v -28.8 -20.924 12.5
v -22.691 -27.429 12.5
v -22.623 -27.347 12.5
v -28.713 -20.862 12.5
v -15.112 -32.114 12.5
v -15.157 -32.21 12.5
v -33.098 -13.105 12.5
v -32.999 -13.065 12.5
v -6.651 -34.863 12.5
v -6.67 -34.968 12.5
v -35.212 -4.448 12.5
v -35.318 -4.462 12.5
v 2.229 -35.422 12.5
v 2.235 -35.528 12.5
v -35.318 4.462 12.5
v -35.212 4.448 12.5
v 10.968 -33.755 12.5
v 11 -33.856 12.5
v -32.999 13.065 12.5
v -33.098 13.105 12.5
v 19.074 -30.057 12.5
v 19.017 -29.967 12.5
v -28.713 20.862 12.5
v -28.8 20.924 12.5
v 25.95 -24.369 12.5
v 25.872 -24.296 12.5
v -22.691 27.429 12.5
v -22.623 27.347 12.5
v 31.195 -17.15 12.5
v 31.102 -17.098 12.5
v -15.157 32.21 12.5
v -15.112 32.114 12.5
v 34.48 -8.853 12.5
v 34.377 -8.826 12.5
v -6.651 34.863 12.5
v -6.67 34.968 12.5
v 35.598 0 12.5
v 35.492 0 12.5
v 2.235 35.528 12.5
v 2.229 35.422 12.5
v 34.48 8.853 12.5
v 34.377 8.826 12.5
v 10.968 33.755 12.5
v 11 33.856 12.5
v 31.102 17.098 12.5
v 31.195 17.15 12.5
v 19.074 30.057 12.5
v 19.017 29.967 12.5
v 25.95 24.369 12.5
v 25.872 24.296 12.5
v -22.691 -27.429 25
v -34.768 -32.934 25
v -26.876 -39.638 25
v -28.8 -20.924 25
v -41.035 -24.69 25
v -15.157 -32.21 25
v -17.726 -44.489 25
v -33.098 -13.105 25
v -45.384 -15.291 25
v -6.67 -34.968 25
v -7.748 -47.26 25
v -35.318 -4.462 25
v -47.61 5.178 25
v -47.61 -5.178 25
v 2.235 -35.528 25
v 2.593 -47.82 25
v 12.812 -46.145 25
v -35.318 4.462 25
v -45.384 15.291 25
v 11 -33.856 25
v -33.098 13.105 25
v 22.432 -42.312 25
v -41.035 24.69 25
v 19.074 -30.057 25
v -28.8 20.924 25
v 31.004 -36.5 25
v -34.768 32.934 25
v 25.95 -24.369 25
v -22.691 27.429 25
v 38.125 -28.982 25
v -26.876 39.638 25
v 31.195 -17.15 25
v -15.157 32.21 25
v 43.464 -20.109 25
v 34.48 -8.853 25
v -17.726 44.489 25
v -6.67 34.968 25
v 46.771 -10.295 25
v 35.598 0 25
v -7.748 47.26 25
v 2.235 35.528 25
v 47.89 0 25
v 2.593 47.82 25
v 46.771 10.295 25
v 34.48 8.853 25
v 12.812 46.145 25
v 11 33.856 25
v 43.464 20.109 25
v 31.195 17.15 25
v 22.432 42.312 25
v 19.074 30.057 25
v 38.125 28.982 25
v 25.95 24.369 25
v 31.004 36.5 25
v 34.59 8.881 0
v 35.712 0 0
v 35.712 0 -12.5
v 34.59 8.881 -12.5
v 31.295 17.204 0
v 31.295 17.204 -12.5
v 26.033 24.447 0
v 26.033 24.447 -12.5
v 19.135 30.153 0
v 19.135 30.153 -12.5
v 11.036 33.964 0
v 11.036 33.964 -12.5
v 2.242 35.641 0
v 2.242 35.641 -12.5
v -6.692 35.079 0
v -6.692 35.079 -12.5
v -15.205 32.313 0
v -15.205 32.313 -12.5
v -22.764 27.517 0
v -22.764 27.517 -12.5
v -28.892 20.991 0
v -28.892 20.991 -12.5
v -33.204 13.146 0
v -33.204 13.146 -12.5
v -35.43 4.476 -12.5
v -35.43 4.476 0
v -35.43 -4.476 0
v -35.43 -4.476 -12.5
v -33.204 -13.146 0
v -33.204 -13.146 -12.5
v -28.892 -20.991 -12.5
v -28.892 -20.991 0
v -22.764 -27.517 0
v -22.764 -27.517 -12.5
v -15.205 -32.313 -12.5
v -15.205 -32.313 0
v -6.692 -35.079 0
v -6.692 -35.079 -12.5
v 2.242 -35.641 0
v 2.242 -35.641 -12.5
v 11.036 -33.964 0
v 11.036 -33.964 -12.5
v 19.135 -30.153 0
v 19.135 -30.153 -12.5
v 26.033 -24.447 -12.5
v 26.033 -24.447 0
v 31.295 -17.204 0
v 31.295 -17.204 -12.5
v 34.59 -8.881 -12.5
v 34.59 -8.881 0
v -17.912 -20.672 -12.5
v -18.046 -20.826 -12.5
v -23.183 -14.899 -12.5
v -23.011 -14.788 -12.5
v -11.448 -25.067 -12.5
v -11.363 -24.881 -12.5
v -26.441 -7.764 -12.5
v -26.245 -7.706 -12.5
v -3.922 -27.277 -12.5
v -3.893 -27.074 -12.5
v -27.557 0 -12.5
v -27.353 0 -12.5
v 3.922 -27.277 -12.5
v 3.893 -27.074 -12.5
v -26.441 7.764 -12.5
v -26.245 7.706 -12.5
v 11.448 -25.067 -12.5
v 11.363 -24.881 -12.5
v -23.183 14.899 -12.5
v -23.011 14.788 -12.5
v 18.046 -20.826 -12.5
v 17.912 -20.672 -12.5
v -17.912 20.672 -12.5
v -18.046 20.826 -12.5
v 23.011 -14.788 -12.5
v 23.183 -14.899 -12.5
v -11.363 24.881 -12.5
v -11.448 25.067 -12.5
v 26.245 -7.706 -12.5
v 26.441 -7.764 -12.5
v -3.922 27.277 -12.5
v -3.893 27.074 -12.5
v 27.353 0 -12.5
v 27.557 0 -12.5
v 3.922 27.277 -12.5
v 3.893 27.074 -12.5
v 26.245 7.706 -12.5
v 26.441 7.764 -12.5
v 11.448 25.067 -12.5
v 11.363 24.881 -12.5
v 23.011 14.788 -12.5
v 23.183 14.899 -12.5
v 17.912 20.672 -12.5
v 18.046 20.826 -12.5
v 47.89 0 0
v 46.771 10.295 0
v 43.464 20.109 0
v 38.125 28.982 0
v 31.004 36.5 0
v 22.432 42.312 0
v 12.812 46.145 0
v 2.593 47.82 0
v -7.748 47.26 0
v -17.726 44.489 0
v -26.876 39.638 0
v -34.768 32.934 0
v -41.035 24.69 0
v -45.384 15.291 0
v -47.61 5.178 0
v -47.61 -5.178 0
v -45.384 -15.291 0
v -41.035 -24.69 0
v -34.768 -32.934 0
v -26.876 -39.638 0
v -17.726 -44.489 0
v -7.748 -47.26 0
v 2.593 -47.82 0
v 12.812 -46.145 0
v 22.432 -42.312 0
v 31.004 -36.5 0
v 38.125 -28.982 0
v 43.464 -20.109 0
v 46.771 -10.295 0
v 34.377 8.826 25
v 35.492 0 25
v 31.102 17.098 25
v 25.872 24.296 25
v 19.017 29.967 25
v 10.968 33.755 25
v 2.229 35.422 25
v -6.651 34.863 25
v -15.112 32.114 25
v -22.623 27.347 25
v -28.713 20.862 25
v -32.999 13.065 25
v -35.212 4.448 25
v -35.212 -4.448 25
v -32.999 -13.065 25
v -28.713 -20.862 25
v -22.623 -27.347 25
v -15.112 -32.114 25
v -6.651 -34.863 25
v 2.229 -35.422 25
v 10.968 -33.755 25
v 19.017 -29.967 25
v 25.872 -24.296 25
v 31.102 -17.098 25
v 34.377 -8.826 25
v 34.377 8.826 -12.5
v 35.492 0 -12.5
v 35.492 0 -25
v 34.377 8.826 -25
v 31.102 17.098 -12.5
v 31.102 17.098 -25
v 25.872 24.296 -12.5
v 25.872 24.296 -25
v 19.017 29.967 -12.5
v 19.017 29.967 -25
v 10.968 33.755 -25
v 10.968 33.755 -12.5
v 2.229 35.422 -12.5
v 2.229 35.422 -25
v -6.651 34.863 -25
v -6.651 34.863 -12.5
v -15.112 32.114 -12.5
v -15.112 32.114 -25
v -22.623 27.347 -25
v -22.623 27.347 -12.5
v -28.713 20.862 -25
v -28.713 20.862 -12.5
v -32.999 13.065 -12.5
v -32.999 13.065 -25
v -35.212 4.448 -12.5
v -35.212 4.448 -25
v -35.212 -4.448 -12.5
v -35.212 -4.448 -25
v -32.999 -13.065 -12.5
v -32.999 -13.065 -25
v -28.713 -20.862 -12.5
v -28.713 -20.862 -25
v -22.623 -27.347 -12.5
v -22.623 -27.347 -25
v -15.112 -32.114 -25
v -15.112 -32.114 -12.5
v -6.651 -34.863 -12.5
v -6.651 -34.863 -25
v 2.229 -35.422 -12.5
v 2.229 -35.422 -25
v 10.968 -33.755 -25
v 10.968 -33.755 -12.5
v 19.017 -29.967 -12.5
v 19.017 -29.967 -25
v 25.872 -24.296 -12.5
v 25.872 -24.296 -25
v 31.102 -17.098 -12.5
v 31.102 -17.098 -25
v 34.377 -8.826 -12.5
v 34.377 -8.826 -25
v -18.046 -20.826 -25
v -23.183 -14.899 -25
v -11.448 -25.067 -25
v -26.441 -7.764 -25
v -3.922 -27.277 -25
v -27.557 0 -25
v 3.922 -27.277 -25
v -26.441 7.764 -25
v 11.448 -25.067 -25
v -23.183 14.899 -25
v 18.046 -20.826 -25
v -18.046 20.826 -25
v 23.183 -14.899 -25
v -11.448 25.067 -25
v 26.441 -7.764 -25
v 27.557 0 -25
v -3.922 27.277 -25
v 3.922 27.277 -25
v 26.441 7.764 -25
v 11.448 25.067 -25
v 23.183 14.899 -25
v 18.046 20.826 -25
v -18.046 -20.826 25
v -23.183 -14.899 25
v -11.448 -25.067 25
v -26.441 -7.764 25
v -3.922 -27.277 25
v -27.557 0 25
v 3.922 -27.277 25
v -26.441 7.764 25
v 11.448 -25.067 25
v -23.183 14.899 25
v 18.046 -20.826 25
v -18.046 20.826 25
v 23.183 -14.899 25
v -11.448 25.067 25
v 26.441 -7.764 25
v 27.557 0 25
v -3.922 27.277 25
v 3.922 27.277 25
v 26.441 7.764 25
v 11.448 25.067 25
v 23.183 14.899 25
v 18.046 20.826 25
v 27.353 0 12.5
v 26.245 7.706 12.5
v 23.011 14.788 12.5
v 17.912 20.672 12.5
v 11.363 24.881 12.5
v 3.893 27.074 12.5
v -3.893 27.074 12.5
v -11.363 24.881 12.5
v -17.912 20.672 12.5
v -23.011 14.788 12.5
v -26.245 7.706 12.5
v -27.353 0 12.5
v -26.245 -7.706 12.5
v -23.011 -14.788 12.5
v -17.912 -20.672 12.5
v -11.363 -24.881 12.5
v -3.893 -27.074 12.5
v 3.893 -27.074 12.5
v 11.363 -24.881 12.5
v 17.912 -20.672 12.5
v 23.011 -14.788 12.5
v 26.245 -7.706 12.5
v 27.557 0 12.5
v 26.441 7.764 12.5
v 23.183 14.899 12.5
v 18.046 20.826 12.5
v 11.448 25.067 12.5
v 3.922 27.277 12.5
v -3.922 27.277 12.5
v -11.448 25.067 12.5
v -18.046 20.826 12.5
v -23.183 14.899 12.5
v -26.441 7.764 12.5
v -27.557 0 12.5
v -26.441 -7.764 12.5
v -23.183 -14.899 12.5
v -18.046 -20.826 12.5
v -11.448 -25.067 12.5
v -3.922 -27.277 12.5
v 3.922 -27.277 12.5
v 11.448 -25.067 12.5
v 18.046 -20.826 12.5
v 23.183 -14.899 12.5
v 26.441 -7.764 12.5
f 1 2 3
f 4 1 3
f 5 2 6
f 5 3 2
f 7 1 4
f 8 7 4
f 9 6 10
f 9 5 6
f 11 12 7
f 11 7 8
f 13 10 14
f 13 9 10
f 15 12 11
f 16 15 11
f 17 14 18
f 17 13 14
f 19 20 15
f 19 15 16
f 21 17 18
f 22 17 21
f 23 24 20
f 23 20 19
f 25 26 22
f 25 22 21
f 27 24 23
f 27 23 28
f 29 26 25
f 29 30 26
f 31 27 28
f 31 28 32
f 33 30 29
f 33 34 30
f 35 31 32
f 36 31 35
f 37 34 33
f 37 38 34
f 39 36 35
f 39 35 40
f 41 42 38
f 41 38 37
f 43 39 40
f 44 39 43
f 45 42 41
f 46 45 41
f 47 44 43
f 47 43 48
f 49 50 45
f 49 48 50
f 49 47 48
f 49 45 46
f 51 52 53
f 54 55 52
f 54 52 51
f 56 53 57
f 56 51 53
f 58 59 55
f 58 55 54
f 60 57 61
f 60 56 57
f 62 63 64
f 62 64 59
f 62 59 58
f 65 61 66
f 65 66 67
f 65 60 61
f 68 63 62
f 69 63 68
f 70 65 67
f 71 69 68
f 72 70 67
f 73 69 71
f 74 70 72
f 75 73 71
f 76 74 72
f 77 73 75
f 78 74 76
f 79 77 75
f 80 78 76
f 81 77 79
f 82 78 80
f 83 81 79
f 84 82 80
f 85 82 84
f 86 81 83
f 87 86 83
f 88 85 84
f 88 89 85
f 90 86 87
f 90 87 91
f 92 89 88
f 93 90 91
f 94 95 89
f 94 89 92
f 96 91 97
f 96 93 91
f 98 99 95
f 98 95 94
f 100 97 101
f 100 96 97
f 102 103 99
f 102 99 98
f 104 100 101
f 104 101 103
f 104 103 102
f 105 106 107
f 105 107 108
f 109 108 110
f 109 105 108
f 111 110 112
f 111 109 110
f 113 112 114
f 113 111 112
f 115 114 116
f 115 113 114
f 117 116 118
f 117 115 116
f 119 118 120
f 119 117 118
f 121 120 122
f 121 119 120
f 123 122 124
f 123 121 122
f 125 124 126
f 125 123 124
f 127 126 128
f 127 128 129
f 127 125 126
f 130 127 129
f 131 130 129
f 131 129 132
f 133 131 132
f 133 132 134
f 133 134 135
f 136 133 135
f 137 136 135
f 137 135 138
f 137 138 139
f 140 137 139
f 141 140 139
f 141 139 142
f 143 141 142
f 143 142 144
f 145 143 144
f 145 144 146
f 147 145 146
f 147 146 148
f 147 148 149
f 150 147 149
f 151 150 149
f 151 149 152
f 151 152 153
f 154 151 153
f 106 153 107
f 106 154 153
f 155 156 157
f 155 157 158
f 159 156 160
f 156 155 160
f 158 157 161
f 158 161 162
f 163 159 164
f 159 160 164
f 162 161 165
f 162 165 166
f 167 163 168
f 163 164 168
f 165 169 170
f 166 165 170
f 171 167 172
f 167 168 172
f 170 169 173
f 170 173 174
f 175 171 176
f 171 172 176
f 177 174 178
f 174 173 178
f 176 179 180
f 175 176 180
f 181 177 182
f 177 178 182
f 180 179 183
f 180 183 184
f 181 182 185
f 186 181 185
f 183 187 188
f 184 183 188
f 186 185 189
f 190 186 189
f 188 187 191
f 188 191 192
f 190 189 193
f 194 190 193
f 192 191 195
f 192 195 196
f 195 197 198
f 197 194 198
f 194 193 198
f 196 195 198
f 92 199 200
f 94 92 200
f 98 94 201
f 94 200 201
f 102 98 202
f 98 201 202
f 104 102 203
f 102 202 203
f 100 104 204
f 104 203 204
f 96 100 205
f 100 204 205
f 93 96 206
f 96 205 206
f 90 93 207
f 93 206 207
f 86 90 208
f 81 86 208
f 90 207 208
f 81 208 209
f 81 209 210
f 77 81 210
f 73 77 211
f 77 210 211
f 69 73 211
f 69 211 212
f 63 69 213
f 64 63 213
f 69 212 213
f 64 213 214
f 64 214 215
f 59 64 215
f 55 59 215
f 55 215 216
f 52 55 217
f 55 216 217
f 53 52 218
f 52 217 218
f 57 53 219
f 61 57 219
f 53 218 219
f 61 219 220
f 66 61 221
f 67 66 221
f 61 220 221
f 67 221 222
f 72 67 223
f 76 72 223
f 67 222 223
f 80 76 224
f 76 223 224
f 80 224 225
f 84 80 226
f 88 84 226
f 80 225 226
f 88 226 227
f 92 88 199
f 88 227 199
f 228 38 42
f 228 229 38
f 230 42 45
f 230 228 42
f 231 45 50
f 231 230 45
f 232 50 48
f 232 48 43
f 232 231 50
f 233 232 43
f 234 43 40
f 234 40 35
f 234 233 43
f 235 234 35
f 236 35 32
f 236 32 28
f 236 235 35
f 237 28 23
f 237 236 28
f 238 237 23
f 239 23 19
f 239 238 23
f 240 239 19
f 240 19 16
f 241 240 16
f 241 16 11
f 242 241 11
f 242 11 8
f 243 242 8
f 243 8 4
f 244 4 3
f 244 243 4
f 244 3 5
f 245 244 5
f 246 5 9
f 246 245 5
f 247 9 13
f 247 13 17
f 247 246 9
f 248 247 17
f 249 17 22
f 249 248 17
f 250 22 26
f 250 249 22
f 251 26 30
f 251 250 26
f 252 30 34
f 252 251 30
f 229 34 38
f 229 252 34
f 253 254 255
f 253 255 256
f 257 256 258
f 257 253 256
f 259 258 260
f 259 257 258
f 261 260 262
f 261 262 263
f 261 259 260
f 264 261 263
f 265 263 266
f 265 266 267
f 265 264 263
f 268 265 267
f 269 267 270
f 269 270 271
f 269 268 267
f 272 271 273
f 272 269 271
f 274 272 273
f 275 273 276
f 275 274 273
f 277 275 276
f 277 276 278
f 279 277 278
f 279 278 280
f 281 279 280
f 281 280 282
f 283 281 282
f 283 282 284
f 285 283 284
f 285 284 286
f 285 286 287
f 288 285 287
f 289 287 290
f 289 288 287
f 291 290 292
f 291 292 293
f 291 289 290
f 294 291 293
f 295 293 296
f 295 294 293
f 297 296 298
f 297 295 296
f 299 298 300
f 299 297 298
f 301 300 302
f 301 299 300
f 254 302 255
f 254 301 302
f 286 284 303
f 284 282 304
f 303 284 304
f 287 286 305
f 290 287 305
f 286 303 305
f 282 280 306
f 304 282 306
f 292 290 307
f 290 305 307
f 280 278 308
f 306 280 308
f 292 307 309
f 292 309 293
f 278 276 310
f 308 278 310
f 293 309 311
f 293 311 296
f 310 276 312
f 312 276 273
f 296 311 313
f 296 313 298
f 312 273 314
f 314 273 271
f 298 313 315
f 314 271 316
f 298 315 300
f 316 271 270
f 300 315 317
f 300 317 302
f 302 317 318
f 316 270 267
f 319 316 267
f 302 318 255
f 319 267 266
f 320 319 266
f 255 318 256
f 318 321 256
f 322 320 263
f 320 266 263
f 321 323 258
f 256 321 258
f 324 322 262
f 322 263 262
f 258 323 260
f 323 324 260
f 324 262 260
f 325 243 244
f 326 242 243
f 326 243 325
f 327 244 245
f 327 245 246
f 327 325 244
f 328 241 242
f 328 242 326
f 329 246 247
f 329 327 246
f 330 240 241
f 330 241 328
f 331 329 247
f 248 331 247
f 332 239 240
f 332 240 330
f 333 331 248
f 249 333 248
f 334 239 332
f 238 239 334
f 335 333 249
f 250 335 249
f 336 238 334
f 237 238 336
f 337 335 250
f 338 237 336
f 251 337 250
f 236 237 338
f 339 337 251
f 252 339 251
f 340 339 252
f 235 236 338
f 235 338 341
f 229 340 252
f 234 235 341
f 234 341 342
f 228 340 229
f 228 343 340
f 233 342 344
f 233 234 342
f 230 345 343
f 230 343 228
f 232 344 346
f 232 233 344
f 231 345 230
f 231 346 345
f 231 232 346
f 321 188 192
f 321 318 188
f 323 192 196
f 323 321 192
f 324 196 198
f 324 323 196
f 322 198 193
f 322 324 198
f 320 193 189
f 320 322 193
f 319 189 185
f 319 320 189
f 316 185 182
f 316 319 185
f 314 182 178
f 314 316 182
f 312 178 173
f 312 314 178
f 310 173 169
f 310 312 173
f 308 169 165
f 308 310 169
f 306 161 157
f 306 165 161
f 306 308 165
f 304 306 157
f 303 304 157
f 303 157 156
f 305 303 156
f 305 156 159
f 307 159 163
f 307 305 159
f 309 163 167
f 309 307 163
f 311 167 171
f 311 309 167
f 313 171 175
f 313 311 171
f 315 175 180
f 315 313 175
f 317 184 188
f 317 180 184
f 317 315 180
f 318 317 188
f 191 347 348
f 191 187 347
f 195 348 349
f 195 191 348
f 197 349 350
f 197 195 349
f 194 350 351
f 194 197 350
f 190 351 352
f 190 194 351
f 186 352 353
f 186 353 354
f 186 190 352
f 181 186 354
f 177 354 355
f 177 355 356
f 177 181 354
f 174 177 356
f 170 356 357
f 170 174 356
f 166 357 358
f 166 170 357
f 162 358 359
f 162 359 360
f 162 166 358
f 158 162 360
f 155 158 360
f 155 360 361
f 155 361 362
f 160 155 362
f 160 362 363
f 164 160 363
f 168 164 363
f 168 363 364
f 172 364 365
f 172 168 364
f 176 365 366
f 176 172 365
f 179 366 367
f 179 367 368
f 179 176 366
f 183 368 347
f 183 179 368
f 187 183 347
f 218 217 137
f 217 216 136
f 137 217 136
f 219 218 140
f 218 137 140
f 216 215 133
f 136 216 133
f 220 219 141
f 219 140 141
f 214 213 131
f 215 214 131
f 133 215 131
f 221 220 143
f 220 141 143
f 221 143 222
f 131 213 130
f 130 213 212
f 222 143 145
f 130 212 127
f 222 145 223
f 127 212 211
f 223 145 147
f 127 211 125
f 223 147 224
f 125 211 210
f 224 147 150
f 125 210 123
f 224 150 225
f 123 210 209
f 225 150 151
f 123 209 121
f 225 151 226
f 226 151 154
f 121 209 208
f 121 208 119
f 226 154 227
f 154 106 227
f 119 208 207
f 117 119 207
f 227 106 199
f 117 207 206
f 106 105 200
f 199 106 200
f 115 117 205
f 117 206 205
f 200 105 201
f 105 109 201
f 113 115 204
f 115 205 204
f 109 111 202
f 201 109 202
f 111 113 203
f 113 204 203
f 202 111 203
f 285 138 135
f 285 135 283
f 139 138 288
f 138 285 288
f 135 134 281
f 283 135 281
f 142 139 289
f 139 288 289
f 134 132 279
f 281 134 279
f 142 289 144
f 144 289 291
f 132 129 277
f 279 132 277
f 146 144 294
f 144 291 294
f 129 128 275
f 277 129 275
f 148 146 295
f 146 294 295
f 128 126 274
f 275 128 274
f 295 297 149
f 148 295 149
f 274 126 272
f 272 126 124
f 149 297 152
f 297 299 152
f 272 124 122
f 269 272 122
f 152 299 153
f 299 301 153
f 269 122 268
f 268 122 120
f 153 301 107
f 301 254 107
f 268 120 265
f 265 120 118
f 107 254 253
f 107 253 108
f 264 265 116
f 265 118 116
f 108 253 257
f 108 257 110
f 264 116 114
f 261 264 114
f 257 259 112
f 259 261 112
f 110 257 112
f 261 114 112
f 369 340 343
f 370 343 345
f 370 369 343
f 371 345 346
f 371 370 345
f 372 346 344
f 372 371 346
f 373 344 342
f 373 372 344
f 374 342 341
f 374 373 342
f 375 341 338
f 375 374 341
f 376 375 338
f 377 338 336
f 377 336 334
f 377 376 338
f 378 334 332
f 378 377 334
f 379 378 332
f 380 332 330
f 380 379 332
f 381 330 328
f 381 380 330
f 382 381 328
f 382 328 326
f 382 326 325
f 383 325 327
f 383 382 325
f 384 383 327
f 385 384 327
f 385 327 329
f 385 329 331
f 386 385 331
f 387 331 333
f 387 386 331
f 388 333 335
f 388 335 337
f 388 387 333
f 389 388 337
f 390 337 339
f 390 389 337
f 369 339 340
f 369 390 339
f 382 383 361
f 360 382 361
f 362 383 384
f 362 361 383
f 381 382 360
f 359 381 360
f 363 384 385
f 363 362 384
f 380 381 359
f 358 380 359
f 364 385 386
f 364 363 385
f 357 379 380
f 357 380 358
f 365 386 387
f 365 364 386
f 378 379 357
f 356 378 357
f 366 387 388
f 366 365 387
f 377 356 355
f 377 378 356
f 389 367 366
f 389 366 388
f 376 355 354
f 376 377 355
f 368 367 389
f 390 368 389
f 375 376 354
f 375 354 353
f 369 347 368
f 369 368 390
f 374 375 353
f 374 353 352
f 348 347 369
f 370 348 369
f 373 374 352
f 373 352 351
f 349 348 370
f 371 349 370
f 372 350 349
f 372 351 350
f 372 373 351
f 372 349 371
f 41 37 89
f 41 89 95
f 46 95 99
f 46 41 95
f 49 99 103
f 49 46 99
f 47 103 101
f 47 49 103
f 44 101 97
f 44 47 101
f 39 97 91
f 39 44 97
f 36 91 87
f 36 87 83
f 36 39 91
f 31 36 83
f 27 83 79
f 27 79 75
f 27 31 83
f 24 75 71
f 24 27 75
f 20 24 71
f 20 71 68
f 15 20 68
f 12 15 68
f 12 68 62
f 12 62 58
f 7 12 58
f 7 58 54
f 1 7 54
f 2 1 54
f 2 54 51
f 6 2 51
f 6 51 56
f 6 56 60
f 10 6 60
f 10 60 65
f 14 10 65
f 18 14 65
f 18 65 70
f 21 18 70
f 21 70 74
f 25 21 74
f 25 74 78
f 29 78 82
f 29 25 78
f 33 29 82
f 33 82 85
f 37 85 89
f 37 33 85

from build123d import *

# Parameters (mm, degrees)
F0_R     = 47.826909
F0_R_2   = 27.35277
F1_DEPTH = 12.5
F2_R     = 35.491808
F2_R_2   = 27.557279
F3_DEPTH = 25
F4_R     = 47.701189
F4_R_2   = 35.254813
F5_DEPTH = 12.5
F6_R     = 48.078981
F6_R_2   = 35.711938
F7_DEPTH = 25
F8_R     = 47.890456
F8_R_2   = 35.598206
F9_DEPTH = 25


with BuildPart() as f1:
    # F0 (on Top) → F1 (new body, symmetric)
    with BuildSketch(Plane.XY):
        Circle(F0_R)
        Circle(F0_R_2, mode=Mode.SUBTRACT)
    extrude(amount=F1_DEPTH, both=True)

    # F2 (on Top) → F3 (join, symmetric)
    with BuildSketch(Plane.XY):
        Circle(F2_R)
        Circle(F2_R_2, mode=Mode.SUBTRACT)
    extrude(amount=F3_DEPTH, both=True)

    # F4 (on Top) → F5 (join, symmetric)
    with BuildSketch(Plane.XY):
        Circle(F4_R)
        Circle(F4_R_2, mode=Mode.SUBTRACT)
    extrude(amount=F5_DEPTH, both=True)

    # F6 (on Top) → F7 (cut)
    with BuildSketch(Plane.XY):
        Circle(F6_R)
        Circle(F6_R_2, mode=Mode.SUBTRACT)
    extrude(amount=-F7_DEPTH, mode=Mode.SUBTRACT)

    # F8 (on Top) → F9 (join)
    with BuildSketch(Plane.XY):
        Circle(F8_R)
        Circle(F8_R_2, mode=Mode.SUBTRACT)
    extrude(amount=F9_DEPTH)


solid = f1.part
